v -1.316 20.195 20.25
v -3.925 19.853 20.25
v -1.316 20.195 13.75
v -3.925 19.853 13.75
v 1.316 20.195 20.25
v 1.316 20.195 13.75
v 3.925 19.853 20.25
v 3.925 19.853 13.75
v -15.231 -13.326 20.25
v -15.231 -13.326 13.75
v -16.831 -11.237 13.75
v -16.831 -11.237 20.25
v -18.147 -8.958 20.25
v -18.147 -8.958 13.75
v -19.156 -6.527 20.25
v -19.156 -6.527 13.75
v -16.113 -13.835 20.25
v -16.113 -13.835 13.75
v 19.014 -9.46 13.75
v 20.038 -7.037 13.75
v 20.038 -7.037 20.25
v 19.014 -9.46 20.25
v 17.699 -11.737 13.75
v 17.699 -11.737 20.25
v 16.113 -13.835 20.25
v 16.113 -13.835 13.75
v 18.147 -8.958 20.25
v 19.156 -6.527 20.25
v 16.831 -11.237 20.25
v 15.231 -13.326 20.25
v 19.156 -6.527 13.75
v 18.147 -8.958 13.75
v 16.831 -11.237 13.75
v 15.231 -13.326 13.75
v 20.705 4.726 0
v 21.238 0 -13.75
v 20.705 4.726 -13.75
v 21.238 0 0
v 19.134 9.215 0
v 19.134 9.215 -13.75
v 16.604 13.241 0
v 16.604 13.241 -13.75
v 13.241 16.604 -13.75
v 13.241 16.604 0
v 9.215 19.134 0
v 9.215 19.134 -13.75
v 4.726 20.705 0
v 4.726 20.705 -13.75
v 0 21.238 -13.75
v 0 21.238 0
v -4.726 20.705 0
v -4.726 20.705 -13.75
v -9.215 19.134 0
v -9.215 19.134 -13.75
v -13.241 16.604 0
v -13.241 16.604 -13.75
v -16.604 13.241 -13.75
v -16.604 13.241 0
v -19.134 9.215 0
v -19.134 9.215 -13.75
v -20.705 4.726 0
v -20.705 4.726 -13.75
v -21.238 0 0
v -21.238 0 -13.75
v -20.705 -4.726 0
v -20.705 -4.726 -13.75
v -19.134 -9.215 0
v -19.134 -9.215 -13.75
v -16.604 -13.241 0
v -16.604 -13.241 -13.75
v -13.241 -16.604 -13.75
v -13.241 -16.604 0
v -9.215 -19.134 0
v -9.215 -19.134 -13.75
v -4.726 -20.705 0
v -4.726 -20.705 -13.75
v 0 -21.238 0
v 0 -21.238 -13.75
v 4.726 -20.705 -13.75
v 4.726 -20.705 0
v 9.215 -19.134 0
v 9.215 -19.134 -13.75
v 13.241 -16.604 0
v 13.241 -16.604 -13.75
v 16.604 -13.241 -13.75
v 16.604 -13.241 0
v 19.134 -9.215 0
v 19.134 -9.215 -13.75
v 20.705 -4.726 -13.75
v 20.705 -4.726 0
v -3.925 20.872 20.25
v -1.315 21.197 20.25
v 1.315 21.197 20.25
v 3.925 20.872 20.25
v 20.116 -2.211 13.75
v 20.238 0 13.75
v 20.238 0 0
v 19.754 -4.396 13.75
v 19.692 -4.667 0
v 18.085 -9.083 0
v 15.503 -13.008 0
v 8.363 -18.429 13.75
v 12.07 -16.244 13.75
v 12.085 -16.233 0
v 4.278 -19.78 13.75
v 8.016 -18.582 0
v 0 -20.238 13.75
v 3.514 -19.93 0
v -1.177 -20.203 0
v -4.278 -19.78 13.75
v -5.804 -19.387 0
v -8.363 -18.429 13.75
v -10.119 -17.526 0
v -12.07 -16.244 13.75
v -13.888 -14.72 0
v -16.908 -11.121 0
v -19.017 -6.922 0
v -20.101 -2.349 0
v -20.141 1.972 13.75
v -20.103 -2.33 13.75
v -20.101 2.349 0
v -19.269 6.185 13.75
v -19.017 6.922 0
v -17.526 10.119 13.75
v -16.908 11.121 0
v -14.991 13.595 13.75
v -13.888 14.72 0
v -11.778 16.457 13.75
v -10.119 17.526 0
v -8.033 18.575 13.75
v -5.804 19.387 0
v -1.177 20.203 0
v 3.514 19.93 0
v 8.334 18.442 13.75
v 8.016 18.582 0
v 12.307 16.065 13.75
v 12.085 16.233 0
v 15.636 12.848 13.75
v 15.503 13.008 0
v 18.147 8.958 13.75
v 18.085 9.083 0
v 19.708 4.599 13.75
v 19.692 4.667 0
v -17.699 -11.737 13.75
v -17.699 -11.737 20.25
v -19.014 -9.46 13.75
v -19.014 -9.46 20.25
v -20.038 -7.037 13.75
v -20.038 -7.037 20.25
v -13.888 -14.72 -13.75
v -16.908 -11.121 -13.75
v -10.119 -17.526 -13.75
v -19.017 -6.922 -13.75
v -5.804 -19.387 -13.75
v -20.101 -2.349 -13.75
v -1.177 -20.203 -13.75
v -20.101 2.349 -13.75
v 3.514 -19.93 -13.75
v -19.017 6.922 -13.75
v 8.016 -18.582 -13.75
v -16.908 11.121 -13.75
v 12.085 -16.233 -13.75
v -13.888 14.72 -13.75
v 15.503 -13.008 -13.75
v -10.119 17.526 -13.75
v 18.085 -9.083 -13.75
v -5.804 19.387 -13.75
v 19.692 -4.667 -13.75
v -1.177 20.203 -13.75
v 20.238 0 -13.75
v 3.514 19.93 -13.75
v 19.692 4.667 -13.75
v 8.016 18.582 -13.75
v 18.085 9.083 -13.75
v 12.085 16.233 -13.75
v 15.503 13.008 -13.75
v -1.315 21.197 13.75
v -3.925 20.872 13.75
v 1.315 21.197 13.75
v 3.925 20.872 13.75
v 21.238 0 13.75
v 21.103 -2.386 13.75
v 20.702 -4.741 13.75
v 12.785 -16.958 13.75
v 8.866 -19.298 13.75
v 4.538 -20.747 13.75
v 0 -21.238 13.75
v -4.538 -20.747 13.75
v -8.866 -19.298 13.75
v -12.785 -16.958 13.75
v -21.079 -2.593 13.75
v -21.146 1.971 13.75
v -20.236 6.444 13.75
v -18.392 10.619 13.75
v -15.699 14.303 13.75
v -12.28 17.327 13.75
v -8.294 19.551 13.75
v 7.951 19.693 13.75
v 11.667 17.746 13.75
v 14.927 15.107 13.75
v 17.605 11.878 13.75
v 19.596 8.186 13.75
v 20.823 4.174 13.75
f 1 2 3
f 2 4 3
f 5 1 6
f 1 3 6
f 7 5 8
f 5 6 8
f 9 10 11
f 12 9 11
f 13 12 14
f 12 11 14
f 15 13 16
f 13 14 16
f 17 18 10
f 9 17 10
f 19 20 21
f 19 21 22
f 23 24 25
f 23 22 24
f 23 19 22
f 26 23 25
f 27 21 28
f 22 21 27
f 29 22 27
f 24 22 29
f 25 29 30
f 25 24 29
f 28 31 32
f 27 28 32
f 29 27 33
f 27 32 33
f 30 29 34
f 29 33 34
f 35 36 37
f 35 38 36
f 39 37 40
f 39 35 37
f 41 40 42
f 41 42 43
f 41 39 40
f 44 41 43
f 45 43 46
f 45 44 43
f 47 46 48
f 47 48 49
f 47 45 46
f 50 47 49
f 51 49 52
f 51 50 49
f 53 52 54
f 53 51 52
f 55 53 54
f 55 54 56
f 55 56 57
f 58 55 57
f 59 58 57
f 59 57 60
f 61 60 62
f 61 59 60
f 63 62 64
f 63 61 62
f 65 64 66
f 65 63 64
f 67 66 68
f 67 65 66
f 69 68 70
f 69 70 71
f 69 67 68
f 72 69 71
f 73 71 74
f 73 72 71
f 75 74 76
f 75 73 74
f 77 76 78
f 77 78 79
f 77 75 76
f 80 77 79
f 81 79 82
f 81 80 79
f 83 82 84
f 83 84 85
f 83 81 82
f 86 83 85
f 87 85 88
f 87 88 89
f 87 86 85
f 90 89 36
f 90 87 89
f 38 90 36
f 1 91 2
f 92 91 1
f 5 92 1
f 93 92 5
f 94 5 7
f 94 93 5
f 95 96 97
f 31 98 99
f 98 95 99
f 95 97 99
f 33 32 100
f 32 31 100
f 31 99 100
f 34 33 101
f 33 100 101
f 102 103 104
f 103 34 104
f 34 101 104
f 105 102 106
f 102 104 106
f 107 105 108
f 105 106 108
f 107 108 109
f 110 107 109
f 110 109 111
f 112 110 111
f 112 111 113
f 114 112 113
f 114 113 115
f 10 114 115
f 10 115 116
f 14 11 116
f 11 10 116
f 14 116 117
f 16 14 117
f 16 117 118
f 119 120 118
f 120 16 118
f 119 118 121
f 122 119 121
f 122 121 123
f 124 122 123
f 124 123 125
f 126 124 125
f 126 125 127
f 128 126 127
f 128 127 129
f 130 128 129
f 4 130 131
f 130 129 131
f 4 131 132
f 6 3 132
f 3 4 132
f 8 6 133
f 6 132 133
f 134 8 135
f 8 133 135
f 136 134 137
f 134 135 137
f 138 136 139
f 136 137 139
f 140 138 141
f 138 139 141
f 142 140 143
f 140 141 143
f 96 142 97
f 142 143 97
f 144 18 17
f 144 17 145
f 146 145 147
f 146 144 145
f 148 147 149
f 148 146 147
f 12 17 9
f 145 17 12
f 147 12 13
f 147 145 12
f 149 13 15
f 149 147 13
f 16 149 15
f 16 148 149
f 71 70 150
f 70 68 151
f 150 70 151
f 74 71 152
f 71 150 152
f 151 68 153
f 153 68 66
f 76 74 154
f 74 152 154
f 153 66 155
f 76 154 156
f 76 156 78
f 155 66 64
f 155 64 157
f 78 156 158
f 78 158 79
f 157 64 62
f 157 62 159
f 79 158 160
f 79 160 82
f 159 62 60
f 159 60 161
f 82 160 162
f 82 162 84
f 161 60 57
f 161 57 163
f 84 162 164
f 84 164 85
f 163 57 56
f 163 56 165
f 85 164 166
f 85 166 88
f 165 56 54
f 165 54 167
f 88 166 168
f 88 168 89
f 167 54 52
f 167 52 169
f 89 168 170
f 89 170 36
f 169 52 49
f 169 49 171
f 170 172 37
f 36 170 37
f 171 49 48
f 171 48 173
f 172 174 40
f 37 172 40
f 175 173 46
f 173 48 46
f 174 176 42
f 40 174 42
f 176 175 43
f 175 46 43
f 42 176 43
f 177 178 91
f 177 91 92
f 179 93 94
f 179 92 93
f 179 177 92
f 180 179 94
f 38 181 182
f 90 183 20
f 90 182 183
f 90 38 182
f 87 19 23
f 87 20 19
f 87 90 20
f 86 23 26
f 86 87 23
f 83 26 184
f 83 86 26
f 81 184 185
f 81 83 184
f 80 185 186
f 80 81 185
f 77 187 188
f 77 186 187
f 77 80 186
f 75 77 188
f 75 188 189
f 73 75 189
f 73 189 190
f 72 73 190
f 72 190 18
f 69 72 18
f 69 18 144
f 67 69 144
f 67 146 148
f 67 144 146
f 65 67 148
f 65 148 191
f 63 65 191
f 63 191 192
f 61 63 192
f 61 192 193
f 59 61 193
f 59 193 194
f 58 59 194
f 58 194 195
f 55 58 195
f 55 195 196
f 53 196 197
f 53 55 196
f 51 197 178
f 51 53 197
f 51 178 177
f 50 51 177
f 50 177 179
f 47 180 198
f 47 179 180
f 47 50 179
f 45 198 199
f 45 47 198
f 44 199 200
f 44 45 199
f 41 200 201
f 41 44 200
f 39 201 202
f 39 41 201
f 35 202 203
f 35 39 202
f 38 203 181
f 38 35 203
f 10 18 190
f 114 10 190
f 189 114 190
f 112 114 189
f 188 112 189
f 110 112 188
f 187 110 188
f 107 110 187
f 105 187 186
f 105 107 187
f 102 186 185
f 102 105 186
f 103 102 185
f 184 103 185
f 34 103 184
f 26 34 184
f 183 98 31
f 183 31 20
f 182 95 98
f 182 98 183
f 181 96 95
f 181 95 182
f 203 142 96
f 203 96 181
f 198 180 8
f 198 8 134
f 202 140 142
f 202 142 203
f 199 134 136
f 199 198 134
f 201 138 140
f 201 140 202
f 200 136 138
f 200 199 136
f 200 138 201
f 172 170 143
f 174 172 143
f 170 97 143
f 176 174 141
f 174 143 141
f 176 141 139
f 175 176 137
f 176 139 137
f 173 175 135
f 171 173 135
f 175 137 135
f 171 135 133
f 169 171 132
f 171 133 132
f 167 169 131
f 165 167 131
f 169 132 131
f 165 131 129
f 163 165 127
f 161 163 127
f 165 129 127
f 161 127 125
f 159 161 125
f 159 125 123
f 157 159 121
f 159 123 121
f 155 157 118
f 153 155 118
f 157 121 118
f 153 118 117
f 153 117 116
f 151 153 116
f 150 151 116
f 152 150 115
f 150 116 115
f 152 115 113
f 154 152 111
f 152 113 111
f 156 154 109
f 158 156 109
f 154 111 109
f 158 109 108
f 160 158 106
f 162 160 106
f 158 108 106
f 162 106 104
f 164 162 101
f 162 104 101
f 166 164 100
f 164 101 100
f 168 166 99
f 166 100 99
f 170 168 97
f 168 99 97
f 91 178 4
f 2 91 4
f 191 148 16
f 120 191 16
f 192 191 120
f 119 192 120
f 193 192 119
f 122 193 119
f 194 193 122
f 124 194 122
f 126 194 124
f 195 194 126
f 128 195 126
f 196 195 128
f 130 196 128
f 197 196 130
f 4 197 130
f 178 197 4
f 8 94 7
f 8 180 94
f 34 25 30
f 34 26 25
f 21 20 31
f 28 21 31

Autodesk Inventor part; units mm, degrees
ref_plane "YZ Plane" through (0, 0, 0) normal (1, 0, 0) x (0, 1, 0)
ref_plane "XZ Plane" through (0, 0, 0) normal (0, 1, 0) x (-1, 0, 0)
sketch "Sketch1" plane through (0, 0, 0) normal (0, 0, 1) x (1, 0, 0)
  circle A0 centre (0, 0) radius 21.2375
  circle A1 centre (0, 0) radius 20.2375
  dimension "d0" = 42.475
  dimension "d1" = 1
extrude "Extrusion1" add sketch "Sketch1" along normal mid plane 27.5
sketch "Sketch2" plane through (0, 0, 13.75) normal (0, 0, 1) x (1, 0, 0)
  circle A0 centre (0, 0) radius 21.2375 projected
  circle A1 centre (0, 0) radius 20.2375 projected
  line L0 (-3.925, 20.8717) -> (-3.925, 19.8532)
  line L1 (3.925, 20.8717) -> (3.925, 19.8532)
  point P0 (0, 13.5869)
  dimension "d4" = 7.85
extrude "Extrusion2" add sketch "Sketch2" along normal blind 6.5 contours L1 A1 L0 A0 picked at (3.0552, 20.3065)
pattern_circular "Circular Pattern1" count 3 over 360 about axis through (0, 0, -10) along (0, 0, 1) of "Extrusion2"
sketch "Sketch3" plane through (0, 0, 0) normal (0, 0, 1) x (1, 0, 0)
  point P0 (0, 0)
ref_plane "Work Plane1" through (0, 0, 20.25) normal (0, 0, 1) x (1, 0, 0)
properties part number "Inner part of servo motor" material "Aluminum 6061-AHC"
